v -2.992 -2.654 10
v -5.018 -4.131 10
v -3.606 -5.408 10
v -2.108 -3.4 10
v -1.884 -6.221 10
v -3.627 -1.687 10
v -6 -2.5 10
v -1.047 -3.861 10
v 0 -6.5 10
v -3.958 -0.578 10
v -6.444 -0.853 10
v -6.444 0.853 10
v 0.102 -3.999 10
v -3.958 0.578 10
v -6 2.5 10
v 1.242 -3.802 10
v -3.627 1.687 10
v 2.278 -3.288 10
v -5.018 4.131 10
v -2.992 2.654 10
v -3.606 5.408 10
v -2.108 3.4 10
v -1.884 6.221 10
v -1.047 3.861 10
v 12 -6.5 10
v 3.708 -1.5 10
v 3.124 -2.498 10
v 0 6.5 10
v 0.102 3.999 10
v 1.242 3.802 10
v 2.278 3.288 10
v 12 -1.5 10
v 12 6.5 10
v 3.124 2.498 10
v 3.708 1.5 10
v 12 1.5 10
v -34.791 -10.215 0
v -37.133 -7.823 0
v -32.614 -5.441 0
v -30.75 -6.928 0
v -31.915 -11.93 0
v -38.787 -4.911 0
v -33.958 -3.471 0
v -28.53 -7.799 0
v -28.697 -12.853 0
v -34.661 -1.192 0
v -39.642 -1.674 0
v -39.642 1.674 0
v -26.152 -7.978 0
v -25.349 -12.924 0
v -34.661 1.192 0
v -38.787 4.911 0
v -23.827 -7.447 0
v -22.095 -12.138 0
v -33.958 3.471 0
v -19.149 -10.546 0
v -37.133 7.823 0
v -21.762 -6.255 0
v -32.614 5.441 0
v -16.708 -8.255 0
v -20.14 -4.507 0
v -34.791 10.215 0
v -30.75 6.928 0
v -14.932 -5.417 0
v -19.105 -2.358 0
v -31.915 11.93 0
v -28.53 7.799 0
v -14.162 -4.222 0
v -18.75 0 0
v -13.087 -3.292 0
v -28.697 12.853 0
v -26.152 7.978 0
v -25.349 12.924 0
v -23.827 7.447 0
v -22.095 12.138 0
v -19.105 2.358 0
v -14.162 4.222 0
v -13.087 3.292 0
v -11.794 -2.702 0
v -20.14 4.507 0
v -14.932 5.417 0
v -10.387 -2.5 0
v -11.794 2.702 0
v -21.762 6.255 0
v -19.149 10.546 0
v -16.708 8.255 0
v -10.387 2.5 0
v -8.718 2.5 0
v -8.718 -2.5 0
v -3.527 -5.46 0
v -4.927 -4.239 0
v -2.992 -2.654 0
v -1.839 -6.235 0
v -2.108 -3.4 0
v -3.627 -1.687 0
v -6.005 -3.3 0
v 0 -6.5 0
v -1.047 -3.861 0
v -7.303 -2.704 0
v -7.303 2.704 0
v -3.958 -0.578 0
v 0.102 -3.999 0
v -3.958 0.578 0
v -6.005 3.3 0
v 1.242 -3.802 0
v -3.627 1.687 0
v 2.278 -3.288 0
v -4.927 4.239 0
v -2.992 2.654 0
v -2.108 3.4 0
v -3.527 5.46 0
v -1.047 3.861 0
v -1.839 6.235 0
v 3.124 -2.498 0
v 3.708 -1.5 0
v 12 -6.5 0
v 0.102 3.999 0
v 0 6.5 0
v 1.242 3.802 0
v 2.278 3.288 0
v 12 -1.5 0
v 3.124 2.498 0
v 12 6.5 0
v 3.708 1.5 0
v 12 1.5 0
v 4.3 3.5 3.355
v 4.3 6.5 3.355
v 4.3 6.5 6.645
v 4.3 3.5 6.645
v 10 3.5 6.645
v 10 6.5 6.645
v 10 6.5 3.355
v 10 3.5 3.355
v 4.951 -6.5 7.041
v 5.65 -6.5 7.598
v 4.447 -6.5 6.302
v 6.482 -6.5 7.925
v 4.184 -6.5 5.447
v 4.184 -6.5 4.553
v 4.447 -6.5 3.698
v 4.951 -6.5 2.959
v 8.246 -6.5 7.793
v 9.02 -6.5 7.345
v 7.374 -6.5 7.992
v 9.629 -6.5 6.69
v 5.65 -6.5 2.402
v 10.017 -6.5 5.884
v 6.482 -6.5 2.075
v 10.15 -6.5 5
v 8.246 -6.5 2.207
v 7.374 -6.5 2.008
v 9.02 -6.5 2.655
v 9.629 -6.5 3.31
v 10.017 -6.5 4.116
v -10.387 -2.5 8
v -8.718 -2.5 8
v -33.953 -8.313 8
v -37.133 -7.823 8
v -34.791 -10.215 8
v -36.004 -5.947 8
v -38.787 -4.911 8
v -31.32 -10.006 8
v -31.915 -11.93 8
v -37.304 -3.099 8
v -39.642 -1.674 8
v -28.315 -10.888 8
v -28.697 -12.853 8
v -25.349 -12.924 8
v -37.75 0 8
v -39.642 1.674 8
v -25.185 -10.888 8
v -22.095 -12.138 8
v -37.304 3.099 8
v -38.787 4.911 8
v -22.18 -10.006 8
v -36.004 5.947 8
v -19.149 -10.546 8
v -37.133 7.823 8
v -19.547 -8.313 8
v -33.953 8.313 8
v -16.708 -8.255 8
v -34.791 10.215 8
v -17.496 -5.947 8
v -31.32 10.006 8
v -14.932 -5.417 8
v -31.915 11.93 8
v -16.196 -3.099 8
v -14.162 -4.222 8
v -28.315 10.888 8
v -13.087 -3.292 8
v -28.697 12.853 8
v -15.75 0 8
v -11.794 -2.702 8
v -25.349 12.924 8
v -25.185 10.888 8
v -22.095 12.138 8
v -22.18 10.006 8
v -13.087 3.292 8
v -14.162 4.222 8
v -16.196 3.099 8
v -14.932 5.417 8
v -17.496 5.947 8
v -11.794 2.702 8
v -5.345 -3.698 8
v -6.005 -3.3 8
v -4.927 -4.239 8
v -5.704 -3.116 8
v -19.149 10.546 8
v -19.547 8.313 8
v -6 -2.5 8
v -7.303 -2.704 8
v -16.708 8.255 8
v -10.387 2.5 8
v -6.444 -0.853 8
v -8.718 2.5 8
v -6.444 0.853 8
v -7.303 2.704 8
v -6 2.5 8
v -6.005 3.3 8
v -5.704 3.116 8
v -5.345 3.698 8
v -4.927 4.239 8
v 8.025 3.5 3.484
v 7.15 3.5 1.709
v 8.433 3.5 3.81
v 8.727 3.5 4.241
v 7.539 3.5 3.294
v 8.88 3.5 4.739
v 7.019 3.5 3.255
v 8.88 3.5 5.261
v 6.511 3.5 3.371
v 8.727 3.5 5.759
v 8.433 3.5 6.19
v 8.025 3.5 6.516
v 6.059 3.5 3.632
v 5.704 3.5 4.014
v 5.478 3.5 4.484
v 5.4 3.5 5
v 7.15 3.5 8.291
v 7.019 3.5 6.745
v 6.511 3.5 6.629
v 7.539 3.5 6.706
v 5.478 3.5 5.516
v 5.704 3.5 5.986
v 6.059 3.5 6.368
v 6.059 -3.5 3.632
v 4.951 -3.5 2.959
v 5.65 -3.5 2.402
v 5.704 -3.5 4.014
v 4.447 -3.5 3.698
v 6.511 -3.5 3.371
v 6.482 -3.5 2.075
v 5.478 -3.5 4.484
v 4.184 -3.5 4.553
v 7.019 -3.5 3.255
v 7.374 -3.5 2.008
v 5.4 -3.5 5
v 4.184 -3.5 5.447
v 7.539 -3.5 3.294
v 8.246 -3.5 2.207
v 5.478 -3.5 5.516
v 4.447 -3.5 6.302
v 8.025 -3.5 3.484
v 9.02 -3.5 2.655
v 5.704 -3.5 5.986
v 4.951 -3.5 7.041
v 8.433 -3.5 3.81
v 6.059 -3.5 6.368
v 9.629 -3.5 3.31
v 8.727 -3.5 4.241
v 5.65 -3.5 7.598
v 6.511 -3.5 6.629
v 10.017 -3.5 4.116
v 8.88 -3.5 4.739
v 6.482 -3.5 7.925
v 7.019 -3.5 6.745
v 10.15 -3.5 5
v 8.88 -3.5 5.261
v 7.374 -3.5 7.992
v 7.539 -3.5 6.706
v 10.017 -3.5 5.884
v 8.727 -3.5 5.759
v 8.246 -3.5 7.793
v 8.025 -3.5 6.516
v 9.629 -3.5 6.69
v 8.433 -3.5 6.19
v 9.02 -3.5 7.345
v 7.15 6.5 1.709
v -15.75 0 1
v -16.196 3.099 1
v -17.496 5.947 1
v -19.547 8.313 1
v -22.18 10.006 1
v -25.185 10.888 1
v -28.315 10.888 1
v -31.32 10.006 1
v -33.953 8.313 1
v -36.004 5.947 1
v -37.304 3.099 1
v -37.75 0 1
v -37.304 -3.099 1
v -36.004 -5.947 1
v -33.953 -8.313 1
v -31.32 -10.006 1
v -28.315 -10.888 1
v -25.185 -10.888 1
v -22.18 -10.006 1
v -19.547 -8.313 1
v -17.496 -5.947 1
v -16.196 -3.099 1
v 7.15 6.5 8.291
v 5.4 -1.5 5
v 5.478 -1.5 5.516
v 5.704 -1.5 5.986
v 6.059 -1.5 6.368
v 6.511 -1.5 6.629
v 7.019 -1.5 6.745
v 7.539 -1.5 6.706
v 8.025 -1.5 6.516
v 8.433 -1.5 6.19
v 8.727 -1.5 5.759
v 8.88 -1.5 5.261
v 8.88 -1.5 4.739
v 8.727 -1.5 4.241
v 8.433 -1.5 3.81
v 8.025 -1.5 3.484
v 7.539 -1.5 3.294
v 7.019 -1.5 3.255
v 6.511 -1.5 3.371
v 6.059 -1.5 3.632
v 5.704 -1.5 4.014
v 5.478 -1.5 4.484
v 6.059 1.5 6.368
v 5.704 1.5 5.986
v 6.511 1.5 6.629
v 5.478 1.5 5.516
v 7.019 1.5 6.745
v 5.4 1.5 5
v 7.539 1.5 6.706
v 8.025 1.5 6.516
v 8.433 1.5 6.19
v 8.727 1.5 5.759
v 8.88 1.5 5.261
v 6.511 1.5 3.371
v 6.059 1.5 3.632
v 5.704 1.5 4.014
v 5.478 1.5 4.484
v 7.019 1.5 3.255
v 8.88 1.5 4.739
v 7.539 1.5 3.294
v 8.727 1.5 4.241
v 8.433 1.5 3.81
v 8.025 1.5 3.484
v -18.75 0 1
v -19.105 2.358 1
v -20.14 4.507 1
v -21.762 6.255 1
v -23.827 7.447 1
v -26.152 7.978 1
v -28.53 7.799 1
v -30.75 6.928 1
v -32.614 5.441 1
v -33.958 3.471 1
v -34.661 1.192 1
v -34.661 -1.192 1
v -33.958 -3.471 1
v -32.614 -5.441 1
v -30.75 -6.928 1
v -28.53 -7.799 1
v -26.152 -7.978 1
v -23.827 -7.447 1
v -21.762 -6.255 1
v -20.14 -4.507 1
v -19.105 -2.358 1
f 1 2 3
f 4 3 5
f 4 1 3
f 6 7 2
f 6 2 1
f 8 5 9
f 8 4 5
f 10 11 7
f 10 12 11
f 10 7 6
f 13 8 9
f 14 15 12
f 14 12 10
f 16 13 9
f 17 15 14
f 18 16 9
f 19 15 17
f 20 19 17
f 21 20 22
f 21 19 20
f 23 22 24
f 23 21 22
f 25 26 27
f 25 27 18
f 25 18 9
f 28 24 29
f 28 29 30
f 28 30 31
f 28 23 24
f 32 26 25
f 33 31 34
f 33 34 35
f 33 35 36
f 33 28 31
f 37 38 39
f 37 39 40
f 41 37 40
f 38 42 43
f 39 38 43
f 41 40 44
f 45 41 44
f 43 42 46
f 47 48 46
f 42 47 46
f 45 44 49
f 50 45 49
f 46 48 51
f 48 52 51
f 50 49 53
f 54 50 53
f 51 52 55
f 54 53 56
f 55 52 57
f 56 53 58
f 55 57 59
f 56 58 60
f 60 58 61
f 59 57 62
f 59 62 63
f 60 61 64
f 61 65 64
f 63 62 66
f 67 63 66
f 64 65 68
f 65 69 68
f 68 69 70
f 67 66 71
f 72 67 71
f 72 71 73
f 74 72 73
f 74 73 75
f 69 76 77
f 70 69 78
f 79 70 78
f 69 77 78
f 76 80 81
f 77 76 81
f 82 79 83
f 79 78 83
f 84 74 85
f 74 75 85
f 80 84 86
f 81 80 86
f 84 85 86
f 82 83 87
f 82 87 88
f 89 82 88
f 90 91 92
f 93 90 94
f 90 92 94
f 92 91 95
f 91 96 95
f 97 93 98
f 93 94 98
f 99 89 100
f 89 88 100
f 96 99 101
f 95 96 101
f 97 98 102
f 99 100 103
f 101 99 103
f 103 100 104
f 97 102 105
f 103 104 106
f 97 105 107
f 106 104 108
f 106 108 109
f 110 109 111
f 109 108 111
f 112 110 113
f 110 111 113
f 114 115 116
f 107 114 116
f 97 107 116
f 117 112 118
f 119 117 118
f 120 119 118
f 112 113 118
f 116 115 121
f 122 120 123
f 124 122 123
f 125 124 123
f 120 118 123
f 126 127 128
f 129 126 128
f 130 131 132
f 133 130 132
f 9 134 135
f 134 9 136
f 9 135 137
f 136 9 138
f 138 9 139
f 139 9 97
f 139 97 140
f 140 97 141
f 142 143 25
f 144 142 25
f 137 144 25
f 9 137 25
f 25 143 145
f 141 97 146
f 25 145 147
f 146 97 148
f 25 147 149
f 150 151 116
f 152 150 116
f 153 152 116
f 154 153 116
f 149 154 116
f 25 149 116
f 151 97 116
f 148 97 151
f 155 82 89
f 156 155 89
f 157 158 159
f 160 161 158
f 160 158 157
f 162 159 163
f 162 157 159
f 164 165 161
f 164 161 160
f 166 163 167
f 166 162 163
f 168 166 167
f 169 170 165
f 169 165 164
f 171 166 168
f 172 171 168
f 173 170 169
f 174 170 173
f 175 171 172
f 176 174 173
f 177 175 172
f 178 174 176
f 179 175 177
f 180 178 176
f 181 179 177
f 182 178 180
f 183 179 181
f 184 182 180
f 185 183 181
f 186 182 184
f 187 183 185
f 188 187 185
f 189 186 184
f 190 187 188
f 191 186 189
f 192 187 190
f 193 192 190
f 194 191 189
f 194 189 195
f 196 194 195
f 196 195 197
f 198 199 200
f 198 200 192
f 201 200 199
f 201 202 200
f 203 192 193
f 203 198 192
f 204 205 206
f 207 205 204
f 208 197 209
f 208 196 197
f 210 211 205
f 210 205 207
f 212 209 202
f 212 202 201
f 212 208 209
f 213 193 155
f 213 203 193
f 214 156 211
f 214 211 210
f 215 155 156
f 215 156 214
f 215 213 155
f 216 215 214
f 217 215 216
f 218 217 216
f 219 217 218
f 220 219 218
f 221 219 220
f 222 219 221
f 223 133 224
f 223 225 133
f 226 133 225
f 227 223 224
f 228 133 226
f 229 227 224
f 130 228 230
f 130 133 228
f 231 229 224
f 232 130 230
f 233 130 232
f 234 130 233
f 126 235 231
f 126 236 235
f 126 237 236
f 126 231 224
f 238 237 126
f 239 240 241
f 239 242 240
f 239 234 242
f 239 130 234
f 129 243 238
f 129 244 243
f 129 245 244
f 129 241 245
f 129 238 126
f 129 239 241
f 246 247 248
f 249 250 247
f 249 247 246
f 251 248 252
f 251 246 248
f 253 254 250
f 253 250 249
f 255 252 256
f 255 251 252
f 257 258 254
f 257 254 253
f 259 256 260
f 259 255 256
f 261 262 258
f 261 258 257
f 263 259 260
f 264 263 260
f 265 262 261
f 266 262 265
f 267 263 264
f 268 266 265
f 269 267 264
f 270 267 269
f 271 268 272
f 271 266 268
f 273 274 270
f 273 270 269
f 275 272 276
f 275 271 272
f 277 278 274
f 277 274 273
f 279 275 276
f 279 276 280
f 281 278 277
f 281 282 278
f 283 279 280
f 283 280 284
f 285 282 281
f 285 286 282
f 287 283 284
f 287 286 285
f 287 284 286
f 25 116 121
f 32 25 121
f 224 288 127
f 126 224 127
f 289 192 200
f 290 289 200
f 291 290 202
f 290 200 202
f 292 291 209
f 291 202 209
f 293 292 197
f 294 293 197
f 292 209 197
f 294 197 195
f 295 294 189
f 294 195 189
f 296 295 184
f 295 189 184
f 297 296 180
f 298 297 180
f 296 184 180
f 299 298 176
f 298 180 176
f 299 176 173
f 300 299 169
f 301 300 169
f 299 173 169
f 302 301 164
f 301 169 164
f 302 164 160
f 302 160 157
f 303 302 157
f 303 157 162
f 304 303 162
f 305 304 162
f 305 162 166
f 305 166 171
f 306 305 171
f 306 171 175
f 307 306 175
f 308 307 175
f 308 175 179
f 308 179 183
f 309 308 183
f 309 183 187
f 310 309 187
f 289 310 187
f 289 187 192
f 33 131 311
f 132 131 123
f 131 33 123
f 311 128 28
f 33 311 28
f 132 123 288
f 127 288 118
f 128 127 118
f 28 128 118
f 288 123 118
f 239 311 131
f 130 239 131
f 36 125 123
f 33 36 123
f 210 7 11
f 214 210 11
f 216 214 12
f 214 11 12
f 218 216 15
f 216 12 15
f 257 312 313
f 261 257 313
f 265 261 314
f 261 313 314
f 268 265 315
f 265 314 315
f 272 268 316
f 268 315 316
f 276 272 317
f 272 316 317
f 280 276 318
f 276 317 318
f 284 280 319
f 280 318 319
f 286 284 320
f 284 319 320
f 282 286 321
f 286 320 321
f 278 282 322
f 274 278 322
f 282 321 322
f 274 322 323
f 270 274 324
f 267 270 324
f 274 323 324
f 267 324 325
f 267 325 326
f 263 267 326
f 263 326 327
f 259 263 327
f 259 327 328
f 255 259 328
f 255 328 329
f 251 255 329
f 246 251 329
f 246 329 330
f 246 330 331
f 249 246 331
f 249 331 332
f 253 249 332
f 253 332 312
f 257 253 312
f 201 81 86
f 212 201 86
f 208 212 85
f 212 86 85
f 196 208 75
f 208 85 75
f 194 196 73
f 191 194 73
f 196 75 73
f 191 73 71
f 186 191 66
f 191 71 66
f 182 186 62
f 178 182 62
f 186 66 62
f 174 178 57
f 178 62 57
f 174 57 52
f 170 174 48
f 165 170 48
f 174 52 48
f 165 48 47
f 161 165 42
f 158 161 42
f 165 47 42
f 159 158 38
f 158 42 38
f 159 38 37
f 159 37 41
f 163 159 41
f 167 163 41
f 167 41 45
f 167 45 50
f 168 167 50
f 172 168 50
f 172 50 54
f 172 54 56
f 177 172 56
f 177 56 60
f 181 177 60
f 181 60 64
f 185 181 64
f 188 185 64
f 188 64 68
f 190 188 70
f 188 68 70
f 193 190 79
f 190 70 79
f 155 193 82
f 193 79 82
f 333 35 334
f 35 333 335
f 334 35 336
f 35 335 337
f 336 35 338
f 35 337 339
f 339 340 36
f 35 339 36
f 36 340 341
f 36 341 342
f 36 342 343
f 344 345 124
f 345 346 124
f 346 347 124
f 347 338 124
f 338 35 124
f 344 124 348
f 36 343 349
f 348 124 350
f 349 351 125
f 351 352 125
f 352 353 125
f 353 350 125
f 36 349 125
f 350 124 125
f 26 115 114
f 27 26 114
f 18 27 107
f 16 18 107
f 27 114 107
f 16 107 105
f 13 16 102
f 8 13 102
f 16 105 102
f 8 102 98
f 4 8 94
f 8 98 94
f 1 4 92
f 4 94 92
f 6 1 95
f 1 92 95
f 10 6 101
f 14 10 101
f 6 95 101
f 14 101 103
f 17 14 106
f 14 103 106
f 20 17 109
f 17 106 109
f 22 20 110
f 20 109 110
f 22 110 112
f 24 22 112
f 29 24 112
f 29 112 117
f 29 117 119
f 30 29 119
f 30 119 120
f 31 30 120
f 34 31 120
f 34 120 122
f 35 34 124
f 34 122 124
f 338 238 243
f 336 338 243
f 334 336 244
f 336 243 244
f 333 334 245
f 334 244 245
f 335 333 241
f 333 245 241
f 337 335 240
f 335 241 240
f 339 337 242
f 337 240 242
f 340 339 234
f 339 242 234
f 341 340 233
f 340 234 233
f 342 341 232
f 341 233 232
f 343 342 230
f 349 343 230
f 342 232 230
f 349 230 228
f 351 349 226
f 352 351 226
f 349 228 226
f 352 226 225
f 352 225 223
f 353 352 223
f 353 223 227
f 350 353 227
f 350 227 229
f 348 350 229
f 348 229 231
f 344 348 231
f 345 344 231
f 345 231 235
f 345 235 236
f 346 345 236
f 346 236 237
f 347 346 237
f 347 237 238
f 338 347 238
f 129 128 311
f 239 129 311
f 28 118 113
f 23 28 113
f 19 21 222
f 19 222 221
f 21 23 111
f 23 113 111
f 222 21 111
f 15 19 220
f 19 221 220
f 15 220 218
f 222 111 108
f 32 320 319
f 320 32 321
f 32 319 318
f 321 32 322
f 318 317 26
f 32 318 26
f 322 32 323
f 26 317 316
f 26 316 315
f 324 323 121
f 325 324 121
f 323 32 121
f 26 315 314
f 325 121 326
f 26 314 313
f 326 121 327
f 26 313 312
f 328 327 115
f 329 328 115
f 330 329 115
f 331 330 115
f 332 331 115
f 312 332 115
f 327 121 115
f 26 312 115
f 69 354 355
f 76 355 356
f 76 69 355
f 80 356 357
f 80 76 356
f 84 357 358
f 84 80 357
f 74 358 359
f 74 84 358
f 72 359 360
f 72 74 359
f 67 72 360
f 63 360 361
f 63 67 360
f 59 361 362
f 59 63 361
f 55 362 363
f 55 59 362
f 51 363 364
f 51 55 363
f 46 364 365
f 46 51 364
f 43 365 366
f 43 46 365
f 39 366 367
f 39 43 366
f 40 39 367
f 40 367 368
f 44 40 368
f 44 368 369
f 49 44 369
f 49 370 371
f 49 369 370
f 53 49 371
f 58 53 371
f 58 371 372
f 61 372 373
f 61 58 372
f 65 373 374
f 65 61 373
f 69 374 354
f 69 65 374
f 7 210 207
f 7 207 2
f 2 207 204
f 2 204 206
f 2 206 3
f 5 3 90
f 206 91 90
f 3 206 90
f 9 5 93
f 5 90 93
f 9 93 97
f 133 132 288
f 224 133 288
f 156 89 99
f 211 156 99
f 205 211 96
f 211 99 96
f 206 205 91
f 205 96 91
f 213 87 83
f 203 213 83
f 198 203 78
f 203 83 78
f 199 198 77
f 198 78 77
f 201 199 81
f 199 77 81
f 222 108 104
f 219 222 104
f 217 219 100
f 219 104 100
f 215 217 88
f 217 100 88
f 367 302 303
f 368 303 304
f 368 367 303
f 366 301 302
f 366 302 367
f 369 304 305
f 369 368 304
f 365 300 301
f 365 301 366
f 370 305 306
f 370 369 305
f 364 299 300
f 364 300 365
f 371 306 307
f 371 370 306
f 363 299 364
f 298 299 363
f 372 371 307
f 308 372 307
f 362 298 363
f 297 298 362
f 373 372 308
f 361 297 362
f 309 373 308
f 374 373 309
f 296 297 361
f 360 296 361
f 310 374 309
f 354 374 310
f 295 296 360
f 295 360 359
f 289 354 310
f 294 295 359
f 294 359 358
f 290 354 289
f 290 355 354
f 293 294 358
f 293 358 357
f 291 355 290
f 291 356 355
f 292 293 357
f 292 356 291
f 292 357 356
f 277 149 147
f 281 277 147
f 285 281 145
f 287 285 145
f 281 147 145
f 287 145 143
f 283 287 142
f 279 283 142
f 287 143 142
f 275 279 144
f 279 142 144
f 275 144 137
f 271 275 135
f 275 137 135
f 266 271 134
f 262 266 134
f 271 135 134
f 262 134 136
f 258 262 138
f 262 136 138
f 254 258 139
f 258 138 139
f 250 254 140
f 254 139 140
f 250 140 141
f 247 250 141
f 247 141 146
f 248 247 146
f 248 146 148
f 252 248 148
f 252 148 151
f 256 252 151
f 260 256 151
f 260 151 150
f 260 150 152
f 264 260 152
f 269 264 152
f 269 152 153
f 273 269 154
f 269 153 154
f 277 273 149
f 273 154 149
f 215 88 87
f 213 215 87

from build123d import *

# Parameters (mm, degrees)
F0_R         = 8
F1_DEPTH     = 10
F2_R         = 11
F3_DEPTH     = 9
F5_DEPTH     = 2
F7_DEPTH     = 3
F8_R         = 1.75
F9_DEPTH     = 19.501
F10_R        = 3
F11_DEPTH    = 3
F12_T1_DEPTH = 8


# Not quite as in the source:
# - a fillet or chamfer that OpenCascade refuses, or shapes differently, is made with other operations: its cross-section is extruded or revolved along the edge and cut away or added


with BuildPart() as f1:
    # F0 (on Top) → F1 (new body)
    with BuildSketch(Plane.XY):
        with BuildLine():
            ThreePointArc((3.7080992435, -1.5), (-4, 0), (3.7080992435, 1.5))
            Line((3.7080992435, 1.5), (12, 1.5))
            Line((12, 1.5), (12, 6.5))
            Line((12, 6.5), (0, 6.5))
            ThreePointArc((0, 6.5), (-3.6055512755, 5.4083269132), (-6, 2.5))
            Line((-6, 2.5), (-13.9926491778, 2.5))
            ThreePointArc((-13.9926491778, 2.5), (-39.75, 0), (-13.9926491778, -2.5))
            Line((-13.9926491778, -2.5), (-6, -2.5))
            ThreePointArc((-6, -2.5), (-3.6055512755, -5.4083269132), (0, -6.5))
            Line((0, -6.5), (12, -6.5))
            Line((12, -6.5), (12, -1.5))
            Line((12, -1.5), (3.7080992435, -1.5))
        make_face()
        with Locations((-26.75, 0)):
            Circle(F0_R, mode=Mode.SUBTRACT)
    extrude(amount=F1_DEPTH)

    # F2 (on face) → F3 (cut)
    with BuildSketch(Plane.XY.offset(10)):
        with Locations((-26.75, 0)):
            Circle(F2_R)
    extrude(amount=-F3_DEPTH, mode=Mode.SUBTRACT)

    # F4 (on face) → F5 (cut)
    with BuildSketch(Plane.XY.offset(10)):
        with BuildLine():
            Line((-6, 2.5), (-13.9926491778, 2.5))
            ThreePointArc((-13.9926491778, 2.5), (-39.75, 0), (-13.9926491778, -2.5))
            Line((-13.9926491778, -2.5), (-6, -2.5))
            ThreePointArc((-6, -2.5), (-6.5, 0), (-6, 2.5))
        make_face()
    extrude(amount=-F5_DEPTH, mode=Mode.SUBTRACT)

    # F6 (on face) → F7 (cut)
    with BuildSketch(Plane(origin=(0, 6.5, 0), x_dir=(-1, 0, 0), z_dir=(0, 1, 0))):
        Polygon((-10, 6.6454482672), (-10, 3.3545517328), (-7.15, 1.7091034656), (-4.3, 3.3545517328), (-4.3, 6.6454482672), (-7.15, 8.2908965344), align=None)
    extrude(amount=-F7_DEPTH, mode=Mode.SUBTRACT)

    # F8 (on face) → F9 (cut, through all)
    with BuildSketch(Plane(origin=(0, 6.5, 0), x_dir=(-1, 0, 0), z_dir=(0, 1, 0))):
        with Locations((-7.15, 5)):
            Circle(F8_R)
    extrude(amount=-F9_DEPTH, mode=Mode.SUBTRACT)

    # F10 (on face) → F11 (cut)
    with BuildSketch(Plane.XZ.offset(6.5)):
        with Locations((7.15, 5)):
            Circle(F10_R)
    extrude(amount=-F11_DEPTH, mode=Mode.SUBTRACT)

    # F12: fillet of radius 5 on 4 edges, made by hand

    # F12_s2 → F12_t1 (join)
    with BuildSketch(Plane.XY):
        with BuildLine():
            ThreePointArc((-8.7177978871, -2.5), (-6.6326537465, -2.9555337043), (-4.9274509797, -4.2391304348))
            ThreePointArc((-4.9274509797, -4.2391304348), (-5.5324894844, -3.4119730516), (-6, -2.5))
            Line((-6, -2.5), (-8.7177978871, -2.5))
        make_face()
        with BuildLine():
            ThreePointArc((-14.9322285425, -5.4166666667), (-13.0872404524, -3.2918729423), (-10.386931828, -2.5))
            Line((-10.386931828, -2.5), (-13.9926491778, -2.5))
            ThreePointArc((-13.9926491778, -2.5), (-14.3762012754, -3.9861140379), (-14.9322285425, -5.4166666667))
        make_face()
        with BuildLine():
            ThreePointArc((-10.386931828, 2.5), (-13.0872404524, 3.2918729423), (-14.9322285425, 5.4166666667))
            ThreePointArc((-14.9322285425, 5.4166666667), (-14.3762012754, 3.9861140379), (-13.9926491778, 2.5))
            Line((-13.9926491778, 2.5), (-10.386931828, 2.5))
        make_face()
        with BuildLine():
            ThreePointArc((-4.9274509797, 4.2391304348), (-6.6326537465, 2.9555337043), (-8.7177978871, 2.5))
            Line((-8.7177978871, 2.5), (-6, 2.5))
            ThreePointArc((-6, 2.5), (-5.5324894844, 3.4119730516), (-4.9274509797, 4.2391304348))
        make_face()
    extrude(amount=F12_T1_DEPTH)


solid = f1.part
